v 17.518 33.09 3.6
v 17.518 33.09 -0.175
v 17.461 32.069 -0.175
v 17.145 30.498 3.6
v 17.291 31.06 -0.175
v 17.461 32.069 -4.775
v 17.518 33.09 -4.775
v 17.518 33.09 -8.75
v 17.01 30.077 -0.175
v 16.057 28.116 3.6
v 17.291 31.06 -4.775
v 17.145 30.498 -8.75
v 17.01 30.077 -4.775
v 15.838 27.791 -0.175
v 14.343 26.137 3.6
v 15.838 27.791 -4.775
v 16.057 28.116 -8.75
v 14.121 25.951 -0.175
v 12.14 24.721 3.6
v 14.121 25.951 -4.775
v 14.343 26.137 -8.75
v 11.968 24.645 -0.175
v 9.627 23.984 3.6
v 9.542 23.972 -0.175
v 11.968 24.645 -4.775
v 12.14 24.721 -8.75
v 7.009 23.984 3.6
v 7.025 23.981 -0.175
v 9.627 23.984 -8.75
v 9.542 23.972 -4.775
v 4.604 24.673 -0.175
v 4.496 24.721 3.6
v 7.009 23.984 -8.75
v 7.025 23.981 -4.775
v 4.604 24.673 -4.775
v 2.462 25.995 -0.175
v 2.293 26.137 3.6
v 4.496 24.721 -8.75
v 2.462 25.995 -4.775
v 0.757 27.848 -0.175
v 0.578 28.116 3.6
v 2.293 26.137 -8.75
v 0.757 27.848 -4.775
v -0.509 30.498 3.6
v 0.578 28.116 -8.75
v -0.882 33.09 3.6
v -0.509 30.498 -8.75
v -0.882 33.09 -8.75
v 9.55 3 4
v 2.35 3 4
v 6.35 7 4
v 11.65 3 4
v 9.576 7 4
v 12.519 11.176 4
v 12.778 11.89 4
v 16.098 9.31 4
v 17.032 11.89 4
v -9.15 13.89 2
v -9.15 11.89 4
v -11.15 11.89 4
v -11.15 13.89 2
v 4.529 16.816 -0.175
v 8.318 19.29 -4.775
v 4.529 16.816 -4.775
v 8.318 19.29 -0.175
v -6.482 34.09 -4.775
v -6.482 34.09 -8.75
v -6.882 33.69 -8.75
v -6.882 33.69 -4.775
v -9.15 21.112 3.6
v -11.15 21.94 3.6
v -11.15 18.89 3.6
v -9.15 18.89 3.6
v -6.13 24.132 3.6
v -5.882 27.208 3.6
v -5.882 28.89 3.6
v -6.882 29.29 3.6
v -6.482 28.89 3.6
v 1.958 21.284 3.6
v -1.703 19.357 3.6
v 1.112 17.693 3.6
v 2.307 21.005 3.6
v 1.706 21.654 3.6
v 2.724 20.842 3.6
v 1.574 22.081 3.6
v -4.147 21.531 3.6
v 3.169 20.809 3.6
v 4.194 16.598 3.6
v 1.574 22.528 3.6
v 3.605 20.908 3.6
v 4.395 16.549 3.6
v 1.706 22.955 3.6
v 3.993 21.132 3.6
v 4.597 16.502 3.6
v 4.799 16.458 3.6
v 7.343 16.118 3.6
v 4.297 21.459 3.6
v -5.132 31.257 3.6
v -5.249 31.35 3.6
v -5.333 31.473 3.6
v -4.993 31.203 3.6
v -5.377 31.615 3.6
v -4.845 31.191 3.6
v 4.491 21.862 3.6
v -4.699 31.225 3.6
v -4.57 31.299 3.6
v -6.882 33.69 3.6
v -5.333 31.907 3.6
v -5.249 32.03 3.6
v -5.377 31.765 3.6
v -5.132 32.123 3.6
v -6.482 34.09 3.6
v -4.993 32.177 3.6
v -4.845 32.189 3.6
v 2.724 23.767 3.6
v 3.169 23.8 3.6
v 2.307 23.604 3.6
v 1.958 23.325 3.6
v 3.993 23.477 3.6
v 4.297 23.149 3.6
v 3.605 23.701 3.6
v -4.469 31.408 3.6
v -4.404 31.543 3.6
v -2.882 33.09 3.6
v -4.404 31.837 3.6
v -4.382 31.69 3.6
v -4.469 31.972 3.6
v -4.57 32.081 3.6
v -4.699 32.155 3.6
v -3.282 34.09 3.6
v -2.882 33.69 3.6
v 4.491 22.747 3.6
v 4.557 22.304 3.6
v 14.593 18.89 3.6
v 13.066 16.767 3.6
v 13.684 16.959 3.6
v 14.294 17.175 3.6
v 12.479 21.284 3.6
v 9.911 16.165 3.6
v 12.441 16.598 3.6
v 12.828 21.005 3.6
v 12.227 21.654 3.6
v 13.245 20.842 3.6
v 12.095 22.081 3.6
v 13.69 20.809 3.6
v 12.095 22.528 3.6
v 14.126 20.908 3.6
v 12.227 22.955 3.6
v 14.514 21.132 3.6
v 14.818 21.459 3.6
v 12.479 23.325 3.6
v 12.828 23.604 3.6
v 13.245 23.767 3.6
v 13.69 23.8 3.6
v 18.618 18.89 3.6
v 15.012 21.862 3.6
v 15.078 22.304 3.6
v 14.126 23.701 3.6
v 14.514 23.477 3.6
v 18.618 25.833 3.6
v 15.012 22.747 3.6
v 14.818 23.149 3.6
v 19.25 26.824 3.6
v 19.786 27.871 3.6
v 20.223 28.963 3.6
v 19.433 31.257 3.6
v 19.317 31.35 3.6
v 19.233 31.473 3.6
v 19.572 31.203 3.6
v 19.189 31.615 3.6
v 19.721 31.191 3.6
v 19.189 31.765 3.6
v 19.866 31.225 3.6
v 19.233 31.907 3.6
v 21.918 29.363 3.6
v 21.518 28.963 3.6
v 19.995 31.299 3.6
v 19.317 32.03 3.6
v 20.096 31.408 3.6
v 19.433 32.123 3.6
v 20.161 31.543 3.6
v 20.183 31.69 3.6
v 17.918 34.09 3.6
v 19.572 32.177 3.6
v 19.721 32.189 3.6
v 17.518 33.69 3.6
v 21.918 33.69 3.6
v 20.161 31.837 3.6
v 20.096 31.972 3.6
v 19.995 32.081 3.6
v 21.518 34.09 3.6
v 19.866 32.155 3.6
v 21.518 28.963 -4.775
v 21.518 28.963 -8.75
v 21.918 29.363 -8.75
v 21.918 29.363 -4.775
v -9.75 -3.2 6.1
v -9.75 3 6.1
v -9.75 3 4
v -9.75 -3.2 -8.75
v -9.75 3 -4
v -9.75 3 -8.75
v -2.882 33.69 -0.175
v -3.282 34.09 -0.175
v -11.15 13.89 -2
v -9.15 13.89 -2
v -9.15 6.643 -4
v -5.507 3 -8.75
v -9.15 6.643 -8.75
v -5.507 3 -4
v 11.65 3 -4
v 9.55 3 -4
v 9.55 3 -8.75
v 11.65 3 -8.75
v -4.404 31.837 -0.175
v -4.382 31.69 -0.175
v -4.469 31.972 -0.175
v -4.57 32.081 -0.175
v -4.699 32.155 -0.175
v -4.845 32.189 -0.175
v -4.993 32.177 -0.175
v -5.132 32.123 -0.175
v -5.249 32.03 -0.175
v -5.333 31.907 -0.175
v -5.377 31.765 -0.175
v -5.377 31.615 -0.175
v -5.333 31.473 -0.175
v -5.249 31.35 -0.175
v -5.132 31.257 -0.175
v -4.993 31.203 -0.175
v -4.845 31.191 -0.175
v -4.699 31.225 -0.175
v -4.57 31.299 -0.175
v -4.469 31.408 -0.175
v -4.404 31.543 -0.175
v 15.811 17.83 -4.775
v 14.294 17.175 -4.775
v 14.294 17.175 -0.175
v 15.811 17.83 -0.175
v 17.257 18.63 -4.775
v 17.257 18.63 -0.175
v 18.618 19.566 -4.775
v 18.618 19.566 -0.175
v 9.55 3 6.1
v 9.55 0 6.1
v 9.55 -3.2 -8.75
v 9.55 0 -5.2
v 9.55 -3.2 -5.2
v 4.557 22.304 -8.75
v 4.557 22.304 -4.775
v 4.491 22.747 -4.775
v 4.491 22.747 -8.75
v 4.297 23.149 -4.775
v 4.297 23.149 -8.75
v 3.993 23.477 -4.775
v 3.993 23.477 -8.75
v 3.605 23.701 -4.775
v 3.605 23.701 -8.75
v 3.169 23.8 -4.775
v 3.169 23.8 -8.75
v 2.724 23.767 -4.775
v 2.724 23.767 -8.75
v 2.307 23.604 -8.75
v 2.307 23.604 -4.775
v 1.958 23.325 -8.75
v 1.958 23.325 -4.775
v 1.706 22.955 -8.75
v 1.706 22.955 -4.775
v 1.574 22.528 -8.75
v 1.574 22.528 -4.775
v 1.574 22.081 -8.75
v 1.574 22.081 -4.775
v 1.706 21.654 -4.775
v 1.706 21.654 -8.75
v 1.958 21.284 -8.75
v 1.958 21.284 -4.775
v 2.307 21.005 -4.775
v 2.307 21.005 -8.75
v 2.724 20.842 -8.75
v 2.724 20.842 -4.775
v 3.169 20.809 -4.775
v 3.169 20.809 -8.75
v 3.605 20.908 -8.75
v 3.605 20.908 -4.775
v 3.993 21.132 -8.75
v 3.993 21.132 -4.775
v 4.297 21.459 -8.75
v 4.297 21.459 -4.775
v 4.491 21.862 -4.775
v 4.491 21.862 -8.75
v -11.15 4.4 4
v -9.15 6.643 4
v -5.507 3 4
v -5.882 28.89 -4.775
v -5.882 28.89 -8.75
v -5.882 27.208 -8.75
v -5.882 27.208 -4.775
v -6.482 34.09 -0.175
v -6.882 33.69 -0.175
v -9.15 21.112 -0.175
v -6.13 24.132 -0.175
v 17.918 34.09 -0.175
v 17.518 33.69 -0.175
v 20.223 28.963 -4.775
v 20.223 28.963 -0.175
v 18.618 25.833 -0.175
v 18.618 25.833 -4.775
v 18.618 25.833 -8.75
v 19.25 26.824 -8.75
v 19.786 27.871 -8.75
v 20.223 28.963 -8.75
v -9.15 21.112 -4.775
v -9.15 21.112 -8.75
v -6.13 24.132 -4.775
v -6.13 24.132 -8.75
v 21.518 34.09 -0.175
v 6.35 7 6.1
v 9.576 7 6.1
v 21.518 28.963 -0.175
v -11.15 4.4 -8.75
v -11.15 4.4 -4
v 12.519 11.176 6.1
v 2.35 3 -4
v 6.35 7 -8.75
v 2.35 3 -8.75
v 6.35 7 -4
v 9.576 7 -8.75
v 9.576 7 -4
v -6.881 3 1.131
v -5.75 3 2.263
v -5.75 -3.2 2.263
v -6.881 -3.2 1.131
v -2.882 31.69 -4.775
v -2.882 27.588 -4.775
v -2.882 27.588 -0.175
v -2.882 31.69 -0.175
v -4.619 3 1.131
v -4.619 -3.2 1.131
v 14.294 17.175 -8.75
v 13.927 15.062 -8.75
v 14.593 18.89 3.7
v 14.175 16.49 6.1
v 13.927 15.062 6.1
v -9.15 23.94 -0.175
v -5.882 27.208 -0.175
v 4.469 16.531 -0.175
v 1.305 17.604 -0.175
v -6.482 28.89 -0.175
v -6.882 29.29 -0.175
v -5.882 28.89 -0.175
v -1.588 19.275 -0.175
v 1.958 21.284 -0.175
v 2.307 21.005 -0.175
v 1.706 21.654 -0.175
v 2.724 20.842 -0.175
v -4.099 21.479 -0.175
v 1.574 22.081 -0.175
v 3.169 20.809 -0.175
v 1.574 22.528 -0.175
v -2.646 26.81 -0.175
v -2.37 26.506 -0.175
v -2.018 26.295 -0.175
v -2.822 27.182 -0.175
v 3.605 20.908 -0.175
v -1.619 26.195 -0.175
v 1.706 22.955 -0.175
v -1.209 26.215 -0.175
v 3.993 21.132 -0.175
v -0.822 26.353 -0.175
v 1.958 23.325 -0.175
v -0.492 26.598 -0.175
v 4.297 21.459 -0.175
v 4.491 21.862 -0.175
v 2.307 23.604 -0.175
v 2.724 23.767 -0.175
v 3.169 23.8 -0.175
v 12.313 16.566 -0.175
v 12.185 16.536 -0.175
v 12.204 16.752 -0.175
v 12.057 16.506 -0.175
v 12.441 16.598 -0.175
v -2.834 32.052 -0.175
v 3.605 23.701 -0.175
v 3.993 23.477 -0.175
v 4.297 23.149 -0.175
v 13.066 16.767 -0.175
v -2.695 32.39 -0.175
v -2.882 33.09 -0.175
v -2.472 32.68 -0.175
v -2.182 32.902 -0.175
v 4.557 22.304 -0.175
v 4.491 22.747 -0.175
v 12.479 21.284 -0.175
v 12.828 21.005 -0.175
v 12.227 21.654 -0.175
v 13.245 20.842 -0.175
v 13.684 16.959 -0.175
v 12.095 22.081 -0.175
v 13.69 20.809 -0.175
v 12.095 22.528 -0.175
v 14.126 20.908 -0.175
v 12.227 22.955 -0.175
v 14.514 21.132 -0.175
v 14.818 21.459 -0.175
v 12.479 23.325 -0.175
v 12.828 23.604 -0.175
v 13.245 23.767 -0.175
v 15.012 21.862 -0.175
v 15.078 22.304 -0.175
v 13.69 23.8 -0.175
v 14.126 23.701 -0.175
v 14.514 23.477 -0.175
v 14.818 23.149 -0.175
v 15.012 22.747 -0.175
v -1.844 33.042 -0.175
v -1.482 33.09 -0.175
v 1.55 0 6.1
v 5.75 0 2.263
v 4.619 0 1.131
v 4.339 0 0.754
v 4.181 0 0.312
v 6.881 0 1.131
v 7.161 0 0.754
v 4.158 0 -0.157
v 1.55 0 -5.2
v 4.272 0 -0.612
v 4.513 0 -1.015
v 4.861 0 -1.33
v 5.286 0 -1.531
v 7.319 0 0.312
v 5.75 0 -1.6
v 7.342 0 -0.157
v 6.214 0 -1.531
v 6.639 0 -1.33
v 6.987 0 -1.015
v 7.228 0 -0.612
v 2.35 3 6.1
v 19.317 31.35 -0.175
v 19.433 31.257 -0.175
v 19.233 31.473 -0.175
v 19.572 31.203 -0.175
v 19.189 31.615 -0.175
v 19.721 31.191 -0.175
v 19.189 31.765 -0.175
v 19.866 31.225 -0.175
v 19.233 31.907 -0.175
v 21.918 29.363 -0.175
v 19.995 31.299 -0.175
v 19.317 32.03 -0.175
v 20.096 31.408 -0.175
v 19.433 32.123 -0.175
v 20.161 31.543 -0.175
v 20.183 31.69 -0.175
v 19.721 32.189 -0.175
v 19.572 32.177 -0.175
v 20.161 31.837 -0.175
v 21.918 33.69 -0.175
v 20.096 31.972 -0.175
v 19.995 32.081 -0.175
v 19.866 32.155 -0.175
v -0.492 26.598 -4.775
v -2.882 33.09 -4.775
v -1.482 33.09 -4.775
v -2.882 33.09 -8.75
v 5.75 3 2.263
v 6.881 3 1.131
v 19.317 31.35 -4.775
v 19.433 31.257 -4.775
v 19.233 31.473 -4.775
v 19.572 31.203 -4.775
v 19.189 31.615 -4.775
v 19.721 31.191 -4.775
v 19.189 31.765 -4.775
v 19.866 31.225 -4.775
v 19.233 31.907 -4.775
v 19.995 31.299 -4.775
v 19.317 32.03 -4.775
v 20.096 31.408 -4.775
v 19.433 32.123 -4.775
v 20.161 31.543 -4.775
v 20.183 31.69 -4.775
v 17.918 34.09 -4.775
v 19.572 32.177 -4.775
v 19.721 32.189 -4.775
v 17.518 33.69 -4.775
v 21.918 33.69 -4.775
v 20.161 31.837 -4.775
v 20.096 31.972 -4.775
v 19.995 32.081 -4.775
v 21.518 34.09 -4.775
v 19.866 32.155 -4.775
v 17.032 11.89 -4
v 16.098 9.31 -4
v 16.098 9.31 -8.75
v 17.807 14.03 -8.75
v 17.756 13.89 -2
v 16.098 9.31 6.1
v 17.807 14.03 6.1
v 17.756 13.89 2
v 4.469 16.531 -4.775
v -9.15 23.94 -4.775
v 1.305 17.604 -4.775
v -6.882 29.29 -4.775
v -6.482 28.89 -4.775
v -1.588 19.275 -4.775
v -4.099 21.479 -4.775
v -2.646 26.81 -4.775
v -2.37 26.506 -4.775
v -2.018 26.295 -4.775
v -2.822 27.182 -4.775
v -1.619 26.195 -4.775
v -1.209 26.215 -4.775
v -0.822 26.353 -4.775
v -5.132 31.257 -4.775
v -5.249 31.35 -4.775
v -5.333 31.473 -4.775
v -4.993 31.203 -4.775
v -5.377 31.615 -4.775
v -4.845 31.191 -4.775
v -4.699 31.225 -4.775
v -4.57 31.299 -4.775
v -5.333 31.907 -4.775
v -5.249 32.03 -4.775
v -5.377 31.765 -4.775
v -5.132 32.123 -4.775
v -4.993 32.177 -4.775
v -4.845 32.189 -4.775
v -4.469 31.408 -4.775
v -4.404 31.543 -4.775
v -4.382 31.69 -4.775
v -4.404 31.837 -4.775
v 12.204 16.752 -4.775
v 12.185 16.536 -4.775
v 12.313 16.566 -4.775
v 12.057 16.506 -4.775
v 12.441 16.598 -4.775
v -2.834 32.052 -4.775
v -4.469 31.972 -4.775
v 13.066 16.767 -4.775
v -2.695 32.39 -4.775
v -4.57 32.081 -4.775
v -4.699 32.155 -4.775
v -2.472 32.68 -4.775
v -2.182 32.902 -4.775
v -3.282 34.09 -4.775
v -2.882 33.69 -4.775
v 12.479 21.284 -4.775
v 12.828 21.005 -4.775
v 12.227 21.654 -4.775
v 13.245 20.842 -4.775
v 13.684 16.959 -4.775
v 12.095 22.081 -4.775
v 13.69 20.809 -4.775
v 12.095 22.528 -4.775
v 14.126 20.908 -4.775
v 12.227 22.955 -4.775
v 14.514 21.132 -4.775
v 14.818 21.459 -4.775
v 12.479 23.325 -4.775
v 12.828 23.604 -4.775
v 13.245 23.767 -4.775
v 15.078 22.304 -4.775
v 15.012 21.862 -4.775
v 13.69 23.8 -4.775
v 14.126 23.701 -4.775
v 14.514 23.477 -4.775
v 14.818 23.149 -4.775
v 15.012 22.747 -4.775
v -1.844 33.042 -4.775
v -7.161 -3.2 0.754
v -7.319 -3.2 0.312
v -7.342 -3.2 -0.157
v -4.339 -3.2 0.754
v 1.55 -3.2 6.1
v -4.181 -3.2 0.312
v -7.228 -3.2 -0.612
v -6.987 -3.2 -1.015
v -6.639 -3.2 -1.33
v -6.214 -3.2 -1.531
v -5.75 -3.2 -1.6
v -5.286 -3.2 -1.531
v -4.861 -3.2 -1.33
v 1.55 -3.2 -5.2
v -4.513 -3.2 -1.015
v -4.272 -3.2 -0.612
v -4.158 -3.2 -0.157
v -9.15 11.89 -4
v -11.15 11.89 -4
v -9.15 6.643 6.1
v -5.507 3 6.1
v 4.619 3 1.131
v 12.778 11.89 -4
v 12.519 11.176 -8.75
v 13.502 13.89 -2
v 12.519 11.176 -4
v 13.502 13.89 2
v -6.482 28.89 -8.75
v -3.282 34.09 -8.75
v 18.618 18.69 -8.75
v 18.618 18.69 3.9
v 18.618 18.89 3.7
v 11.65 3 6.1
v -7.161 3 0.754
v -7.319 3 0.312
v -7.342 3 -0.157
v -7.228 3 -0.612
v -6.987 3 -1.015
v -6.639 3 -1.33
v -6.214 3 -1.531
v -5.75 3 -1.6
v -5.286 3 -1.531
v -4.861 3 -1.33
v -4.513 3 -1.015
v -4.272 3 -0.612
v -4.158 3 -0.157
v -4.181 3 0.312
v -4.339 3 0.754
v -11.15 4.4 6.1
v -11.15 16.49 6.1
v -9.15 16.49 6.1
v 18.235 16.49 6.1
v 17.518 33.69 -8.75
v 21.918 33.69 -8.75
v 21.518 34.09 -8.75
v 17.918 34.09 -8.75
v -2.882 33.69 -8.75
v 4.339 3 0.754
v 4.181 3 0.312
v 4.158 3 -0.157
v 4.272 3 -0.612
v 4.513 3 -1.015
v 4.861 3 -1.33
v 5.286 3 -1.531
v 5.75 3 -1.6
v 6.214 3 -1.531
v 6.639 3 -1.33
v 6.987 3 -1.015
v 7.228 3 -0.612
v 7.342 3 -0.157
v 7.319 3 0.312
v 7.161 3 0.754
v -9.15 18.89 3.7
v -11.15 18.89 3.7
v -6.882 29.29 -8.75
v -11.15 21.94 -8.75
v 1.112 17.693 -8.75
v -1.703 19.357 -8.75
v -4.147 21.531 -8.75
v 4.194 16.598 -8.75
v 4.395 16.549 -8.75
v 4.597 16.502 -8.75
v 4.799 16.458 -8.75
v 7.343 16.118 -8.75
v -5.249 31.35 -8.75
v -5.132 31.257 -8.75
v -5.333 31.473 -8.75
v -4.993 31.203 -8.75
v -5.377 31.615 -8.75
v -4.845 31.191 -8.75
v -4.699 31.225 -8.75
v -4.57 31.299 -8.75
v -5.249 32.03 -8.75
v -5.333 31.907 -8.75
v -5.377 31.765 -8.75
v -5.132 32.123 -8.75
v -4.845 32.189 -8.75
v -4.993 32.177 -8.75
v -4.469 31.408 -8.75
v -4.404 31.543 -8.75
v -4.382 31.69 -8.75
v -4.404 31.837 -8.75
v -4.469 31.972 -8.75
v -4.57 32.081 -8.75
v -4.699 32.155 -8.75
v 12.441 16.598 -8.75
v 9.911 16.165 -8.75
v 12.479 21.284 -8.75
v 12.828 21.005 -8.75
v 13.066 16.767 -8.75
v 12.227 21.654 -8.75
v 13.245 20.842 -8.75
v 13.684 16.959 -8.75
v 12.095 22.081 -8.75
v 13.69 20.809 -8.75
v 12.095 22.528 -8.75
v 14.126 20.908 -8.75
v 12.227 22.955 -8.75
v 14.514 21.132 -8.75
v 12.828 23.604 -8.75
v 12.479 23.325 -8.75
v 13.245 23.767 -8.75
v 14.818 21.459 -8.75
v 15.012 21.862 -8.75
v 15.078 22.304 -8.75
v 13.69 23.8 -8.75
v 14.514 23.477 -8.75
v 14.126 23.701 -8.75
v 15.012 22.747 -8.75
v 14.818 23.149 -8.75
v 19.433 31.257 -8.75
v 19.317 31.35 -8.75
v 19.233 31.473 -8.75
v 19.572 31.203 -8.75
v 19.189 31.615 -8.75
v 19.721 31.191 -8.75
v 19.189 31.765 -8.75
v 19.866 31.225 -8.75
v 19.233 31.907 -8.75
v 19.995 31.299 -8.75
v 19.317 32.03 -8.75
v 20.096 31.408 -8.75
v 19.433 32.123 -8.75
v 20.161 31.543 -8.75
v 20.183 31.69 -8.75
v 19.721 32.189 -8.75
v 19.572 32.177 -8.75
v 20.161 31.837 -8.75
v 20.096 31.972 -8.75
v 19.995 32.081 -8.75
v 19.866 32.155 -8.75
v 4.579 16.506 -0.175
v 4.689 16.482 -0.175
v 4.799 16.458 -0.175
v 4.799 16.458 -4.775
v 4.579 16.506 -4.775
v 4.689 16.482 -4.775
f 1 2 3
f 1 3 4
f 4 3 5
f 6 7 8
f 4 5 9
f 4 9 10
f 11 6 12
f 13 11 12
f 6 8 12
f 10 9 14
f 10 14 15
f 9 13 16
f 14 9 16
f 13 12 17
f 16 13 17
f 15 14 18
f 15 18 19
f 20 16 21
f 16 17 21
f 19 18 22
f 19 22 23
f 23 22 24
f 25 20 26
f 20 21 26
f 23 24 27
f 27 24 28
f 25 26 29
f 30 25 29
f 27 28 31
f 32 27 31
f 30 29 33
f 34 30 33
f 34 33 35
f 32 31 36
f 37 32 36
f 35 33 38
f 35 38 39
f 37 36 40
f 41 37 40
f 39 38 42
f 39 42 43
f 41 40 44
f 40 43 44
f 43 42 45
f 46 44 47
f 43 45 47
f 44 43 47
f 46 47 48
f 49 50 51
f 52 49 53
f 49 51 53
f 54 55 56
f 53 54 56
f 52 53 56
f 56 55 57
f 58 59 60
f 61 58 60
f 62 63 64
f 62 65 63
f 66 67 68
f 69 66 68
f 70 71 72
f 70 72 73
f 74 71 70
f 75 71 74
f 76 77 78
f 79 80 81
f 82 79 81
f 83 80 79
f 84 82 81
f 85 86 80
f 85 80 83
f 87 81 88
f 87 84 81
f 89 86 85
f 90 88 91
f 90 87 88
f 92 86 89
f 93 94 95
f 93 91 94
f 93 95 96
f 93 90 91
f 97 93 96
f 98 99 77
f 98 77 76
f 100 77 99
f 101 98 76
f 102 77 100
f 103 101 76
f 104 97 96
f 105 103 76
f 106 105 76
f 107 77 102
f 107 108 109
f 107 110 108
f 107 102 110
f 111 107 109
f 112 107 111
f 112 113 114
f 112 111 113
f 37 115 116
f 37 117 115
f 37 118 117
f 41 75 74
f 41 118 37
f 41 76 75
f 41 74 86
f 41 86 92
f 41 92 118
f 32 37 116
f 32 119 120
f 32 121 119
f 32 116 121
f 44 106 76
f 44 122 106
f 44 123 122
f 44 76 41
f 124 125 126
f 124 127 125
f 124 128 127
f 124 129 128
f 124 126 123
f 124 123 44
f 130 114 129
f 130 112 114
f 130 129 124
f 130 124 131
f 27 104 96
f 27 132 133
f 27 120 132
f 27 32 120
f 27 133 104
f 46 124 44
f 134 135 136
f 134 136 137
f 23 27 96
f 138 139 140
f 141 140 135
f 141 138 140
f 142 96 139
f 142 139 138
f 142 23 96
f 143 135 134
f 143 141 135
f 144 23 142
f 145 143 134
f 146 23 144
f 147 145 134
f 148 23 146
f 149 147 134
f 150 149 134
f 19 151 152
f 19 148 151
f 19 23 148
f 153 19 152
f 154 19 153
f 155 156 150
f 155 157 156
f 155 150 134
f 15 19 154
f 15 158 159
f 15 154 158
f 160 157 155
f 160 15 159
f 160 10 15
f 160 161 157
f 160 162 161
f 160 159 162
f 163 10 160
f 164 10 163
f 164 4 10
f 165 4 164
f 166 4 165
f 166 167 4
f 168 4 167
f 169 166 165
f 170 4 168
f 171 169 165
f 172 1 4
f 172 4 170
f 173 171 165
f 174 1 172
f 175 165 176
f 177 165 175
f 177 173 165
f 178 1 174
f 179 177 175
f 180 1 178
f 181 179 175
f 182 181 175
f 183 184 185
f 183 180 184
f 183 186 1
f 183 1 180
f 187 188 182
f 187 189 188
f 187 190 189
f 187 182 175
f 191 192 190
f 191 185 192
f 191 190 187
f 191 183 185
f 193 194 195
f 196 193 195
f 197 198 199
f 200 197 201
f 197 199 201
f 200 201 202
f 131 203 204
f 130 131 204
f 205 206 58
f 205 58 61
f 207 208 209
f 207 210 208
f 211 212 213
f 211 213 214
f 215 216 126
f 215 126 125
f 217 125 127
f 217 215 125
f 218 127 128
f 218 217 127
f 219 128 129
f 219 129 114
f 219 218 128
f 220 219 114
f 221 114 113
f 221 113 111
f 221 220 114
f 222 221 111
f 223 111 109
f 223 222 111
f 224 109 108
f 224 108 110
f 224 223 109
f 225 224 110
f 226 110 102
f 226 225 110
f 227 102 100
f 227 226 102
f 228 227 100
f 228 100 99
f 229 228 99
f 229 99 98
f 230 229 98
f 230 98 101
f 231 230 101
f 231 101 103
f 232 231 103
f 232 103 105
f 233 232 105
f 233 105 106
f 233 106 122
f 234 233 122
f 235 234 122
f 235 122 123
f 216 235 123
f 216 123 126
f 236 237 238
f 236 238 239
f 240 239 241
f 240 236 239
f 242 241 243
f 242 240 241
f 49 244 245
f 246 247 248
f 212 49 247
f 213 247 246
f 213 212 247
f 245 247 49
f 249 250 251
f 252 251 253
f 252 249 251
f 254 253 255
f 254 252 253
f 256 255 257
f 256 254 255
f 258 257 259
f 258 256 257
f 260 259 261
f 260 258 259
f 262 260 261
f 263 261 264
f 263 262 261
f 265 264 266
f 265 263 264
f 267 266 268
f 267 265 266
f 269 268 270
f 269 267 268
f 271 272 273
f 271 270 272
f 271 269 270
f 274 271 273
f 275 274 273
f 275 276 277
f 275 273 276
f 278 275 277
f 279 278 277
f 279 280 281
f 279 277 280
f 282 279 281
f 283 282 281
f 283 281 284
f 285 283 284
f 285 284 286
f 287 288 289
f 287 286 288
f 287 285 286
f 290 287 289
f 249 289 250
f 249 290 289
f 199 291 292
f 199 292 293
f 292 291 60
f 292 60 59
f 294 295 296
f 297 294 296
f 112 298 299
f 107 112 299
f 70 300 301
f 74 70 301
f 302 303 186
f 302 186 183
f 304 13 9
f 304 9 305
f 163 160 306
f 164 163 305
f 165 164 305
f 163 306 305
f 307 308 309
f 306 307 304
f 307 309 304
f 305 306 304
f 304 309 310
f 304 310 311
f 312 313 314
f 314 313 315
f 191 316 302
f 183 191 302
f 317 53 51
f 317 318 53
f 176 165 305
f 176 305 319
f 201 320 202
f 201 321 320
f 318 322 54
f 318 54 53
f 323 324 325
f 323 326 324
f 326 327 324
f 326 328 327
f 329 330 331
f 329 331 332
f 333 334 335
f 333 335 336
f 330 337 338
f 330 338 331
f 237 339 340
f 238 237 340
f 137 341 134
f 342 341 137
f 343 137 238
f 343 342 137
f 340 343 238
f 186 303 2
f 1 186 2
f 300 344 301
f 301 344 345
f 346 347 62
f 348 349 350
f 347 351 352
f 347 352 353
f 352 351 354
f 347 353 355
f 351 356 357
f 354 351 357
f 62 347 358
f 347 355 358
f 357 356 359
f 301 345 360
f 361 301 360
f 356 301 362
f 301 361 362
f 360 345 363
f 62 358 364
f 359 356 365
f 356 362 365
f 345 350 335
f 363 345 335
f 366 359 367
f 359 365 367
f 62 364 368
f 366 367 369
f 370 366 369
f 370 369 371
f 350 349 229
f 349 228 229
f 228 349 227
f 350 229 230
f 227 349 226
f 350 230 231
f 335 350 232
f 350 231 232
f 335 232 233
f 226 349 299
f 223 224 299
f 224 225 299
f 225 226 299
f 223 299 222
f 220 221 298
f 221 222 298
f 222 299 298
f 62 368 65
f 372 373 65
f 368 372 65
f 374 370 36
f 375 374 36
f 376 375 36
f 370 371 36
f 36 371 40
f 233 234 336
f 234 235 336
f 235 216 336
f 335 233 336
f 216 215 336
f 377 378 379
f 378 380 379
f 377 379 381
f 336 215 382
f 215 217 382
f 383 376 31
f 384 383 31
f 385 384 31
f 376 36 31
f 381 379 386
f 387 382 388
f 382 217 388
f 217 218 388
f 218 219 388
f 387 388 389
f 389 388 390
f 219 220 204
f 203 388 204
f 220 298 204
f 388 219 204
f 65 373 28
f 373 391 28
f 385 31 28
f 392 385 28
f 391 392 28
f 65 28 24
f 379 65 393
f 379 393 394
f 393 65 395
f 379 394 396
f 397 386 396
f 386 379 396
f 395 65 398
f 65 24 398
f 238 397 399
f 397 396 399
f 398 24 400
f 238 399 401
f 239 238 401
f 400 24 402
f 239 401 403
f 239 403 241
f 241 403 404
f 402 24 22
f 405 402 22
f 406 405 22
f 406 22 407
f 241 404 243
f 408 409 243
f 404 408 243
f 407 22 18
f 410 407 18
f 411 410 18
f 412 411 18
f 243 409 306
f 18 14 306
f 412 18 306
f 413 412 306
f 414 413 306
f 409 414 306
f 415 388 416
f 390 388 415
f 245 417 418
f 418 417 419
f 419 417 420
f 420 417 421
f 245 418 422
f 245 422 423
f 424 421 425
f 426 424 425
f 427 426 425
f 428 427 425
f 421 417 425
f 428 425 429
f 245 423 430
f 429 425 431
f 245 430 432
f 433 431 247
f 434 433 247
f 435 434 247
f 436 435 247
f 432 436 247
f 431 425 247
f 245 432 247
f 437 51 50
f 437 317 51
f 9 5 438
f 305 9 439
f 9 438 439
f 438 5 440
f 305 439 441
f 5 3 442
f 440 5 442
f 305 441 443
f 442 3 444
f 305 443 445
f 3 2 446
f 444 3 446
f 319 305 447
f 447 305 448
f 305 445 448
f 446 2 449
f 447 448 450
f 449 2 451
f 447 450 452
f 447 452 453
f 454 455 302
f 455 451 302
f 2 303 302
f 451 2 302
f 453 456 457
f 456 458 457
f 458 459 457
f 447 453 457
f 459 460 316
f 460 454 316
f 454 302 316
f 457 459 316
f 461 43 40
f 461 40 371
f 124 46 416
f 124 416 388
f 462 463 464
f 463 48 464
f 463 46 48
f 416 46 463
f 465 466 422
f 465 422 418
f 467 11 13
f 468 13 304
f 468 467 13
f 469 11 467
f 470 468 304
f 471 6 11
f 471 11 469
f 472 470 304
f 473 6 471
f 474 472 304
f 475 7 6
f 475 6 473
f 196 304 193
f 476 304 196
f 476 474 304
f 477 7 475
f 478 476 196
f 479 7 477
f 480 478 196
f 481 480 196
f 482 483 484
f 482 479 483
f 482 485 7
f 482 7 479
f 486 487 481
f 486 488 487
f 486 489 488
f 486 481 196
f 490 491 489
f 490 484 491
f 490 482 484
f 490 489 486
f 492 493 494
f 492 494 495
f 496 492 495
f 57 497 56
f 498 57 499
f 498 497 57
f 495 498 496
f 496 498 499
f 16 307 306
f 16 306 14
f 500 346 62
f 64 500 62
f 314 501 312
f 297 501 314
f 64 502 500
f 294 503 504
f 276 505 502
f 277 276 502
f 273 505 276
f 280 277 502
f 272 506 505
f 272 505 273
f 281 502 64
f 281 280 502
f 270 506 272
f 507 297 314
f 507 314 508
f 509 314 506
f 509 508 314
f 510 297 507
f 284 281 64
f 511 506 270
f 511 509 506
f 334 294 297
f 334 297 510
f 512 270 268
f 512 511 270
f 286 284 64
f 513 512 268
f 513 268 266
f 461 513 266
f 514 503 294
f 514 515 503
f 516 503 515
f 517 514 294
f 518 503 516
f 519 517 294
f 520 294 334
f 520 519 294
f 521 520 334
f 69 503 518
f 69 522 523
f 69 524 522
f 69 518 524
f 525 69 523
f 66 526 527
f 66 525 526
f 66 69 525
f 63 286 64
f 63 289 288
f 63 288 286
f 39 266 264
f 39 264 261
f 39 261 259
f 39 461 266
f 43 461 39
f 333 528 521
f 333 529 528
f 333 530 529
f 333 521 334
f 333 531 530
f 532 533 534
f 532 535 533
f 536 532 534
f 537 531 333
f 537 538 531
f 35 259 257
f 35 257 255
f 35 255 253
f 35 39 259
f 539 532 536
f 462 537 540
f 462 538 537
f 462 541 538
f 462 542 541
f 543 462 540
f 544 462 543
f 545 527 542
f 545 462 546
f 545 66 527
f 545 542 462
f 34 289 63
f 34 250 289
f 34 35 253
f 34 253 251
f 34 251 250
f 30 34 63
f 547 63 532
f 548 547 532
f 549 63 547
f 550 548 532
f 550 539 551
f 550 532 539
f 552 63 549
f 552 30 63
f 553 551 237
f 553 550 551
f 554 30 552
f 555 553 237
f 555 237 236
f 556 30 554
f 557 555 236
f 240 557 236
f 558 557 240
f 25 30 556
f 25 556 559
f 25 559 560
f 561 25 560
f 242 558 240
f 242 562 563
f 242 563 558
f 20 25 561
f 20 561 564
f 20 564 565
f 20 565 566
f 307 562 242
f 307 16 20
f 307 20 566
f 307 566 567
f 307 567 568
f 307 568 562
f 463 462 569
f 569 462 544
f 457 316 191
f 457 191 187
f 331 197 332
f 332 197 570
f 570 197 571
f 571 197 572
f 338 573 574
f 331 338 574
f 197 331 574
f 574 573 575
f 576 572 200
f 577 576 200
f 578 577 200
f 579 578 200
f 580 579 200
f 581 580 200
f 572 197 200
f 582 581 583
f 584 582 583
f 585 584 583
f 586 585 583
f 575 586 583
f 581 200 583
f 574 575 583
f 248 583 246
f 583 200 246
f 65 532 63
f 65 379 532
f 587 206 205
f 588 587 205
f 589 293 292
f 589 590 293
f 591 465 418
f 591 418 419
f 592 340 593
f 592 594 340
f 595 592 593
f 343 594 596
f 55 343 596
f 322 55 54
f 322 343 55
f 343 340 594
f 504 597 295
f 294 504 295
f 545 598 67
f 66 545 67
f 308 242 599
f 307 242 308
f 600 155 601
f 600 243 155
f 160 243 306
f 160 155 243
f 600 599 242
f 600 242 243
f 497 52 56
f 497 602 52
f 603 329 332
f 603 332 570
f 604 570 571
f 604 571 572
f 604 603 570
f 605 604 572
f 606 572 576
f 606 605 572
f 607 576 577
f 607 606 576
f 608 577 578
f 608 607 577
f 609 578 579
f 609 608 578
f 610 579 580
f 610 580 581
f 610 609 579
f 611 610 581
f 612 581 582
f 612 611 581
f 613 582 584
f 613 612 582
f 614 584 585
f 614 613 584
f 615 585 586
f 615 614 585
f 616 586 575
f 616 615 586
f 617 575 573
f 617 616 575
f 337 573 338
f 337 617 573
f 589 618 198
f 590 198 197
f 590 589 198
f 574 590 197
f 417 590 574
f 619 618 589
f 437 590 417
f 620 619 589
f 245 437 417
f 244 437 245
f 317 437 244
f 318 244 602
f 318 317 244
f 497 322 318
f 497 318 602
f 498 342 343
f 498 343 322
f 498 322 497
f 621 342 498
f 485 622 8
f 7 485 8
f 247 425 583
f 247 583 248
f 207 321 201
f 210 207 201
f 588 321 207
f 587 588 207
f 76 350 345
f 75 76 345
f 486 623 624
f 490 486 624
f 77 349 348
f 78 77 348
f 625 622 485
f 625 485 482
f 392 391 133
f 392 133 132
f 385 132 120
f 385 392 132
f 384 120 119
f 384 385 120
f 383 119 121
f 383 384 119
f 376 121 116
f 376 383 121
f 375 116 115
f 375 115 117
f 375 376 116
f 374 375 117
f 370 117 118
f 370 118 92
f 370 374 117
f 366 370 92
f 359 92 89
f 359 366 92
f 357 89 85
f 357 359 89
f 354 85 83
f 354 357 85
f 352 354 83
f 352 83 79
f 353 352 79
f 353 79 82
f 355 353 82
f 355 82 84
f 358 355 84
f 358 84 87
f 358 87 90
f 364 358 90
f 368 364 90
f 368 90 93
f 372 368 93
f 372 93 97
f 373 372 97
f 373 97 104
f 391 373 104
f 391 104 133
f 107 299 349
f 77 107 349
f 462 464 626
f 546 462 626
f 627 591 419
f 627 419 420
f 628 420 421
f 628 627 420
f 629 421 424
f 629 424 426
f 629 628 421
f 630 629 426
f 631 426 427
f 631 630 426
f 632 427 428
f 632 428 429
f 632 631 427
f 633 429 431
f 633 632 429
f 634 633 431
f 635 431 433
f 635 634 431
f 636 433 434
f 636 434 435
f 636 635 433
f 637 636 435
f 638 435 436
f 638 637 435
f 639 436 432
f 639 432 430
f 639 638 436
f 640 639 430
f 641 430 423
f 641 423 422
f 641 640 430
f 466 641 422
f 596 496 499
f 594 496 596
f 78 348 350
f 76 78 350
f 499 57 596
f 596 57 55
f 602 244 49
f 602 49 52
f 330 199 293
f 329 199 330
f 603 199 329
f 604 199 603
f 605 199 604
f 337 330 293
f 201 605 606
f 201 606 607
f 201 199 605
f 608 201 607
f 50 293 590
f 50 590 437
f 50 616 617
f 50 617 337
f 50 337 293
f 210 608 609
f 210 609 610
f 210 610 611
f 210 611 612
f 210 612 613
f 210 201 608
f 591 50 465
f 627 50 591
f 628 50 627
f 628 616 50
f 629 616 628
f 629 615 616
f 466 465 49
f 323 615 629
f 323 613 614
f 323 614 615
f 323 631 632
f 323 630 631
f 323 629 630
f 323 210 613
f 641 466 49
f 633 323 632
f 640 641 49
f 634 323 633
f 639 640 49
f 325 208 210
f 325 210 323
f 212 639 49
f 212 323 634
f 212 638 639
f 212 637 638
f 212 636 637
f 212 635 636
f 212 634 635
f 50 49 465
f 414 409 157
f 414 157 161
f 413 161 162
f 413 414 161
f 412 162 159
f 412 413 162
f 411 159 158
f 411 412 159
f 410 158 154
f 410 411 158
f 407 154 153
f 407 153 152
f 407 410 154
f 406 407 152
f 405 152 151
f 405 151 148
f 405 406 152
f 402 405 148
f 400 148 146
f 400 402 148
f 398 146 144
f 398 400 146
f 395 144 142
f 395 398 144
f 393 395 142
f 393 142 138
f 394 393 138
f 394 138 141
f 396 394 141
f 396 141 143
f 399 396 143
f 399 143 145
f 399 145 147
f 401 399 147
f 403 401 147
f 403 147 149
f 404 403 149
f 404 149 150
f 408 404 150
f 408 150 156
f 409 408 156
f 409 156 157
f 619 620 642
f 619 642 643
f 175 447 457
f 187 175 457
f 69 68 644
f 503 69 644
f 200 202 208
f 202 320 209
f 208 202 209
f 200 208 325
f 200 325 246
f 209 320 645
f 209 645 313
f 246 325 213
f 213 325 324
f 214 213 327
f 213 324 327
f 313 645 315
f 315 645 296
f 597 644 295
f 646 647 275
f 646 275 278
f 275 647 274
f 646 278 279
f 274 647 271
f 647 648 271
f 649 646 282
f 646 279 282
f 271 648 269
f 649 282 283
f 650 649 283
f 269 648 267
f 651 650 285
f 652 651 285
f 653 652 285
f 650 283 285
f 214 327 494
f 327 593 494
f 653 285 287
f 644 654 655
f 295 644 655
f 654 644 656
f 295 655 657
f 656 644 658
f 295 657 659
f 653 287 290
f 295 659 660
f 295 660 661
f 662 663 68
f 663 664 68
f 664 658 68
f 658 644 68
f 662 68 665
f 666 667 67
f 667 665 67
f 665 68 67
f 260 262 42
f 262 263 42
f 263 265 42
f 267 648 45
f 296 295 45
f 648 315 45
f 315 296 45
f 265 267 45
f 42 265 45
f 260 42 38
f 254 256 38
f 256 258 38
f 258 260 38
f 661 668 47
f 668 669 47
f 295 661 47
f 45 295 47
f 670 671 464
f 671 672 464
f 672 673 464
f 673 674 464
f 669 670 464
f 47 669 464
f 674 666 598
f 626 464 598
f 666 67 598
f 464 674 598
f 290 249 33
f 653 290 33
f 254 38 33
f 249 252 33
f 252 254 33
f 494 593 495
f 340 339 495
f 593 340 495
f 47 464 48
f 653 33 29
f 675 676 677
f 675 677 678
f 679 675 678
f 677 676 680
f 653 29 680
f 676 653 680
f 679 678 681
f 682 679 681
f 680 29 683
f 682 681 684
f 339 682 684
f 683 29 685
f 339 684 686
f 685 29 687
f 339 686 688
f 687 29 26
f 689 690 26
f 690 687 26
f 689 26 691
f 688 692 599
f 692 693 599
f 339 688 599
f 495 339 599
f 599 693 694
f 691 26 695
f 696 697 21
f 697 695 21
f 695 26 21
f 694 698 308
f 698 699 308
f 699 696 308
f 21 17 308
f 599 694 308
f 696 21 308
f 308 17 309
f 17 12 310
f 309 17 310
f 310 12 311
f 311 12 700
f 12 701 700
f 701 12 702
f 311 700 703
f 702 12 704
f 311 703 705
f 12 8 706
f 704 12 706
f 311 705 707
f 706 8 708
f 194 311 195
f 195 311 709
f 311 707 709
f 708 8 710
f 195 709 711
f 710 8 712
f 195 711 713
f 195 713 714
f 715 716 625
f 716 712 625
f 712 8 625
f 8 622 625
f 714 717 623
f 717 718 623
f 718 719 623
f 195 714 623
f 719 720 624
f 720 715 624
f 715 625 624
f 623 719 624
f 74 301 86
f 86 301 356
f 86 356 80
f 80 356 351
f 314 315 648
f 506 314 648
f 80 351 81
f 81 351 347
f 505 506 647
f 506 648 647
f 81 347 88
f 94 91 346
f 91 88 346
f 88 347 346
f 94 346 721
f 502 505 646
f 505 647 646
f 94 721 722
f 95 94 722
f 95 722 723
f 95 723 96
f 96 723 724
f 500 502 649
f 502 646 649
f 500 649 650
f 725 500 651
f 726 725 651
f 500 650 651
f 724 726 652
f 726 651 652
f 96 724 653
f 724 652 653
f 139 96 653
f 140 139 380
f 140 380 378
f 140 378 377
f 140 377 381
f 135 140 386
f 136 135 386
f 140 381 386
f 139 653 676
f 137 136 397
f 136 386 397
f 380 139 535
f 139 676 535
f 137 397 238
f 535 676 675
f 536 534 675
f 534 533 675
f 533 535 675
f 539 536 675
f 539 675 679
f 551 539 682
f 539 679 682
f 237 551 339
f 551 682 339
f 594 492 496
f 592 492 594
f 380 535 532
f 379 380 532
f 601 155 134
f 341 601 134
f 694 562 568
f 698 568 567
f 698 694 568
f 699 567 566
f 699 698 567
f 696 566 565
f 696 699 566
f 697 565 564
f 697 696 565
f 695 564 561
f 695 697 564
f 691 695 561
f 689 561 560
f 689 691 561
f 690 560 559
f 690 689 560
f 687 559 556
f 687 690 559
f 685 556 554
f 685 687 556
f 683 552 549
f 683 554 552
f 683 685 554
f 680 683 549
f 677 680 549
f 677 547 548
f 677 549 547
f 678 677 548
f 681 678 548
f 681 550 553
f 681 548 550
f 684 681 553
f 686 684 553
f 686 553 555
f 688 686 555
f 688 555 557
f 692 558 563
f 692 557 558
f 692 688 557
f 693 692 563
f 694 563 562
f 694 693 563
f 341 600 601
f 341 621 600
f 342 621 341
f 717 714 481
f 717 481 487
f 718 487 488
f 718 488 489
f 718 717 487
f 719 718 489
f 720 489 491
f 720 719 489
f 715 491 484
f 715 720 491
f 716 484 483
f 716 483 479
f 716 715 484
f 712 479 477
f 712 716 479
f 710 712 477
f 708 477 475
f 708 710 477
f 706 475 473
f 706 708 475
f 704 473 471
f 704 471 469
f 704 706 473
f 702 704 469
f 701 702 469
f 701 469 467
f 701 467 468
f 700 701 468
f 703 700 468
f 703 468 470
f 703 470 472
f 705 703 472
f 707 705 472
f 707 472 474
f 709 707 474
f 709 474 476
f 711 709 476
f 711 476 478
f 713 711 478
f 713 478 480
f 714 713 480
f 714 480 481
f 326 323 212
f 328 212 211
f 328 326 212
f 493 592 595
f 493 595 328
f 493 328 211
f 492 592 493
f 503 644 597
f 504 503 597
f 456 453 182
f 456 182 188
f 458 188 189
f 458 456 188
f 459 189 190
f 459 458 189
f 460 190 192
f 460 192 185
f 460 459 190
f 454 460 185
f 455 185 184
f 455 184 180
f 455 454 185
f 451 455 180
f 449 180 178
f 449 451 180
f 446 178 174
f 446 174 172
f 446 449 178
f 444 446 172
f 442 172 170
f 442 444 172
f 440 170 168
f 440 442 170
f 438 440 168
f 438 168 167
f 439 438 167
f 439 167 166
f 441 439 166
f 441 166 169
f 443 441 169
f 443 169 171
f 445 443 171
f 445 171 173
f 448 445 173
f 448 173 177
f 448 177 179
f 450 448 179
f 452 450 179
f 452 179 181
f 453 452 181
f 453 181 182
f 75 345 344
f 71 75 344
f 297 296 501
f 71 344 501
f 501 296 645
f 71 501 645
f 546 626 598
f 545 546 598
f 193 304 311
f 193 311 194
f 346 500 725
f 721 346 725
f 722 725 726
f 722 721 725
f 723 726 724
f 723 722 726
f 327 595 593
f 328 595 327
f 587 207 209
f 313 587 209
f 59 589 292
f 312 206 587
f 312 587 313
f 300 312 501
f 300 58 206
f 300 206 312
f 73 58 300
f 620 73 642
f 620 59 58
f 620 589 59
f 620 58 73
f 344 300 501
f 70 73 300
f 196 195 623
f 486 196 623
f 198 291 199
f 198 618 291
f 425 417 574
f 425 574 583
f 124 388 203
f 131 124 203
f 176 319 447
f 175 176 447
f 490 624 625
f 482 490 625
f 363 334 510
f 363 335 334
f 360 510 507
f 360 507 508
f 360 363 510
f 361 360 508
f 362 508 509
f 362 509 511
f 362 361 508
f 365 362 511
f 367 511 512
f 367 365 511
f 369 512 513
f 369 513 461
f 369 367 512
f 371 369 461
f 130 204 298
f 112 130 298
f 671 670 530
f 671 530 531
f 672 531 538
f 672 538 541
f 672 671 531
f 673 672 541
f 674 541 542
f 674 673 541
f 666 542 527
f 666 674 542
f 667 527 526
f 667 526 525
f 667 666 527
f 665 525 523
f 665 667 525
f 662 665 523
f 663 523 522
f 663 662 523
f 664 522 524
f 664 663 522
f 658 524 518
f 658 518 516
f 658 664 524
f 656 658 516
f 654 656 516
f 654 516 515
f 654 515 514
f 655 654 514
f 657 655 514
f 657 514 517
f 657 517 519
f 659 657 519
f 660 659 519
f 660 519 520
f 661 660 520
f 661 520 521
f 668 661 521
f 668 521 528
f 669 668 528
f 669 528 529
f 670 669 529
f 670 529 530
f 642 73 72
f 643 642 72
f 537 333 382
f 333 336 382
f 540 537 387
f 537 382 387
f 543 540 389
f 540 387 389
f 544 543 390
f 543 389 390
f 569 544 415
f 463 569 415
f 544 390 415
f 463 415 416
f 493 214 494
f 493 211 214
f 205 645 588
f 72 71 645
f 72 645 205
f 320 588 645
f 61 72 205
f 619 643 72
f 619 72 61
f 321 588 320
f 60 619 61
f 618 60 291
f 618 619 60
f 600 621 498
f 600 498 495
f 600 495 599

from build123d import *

# Parameters (mm, degrees)
BOSS_EXTRUDE1_DEPTH             = 3.2
BOSS_EXTRUDE2_START             = 3
SKETCH1_3_W                     = 19.3
SKETCH1_3_H                     = 14.85
BOSS_EXTRUDE2_DEPTH             = 3
BOSS_EXTRUDE3_DEPTH             = 3.6
BOSS_EXTRUDE3_DEPTH_BACK        = 8.75
BOSS_EXTRUDE4_REACH             = 42.113
BOSS_EXTRUDE4_DIRECTION_2_REACH = 42.113
CHAMFER1_SIZE                   = 2.4
CUT_EXTRUDE1_DEPTH              = 4
CUT_EXTRUDE1_DEPTH_BACK         = 4
CHAMFER2_SIZE                   = 2
BOSS_EXTRUDE5_START             = -6.175
BOSS_EXTRUDE5_DEPTH             = 12.35
CUT_EXTRUDE2_START              = -2.2
CUT_EXTRUDE2_OUTLINE_R          = 0.5
CUT_EXTRUDE2_DEPTH              = 4.6
CUT_EXTRUDE3_START              = -6.175
SKETCH4_5_R                     = 1.5
SKETCH4_5_R_2                   = 0.5
CUT_EXTRUDE3_DEPTH              = 12.35
BOSS_EXTRUDE6_REACH             = 43.446
BOSS_EXTRUDE6_DIRECTION_2_REACH = 43.446
FILLET1_R                       = 1.4
CHAMFER3_SIZE                   = 0.4
CHAMFER3_SIZE_2                 = 0.283047342


with BuildPart() as part:
    # Sketch1 → Boss-Extrude1 (new body)
    with BuildSketch(Plane(origin=(0, 0, 0), x_dir=(1, 0, 0), z_dir=(0, 1, 0))):
        Polygon((-9.75, 8.75), (-9.75, -6.1), (1.55, -6.1), (1.55, 5.2), (9.55, 5.2), (9.55, 8.75), align=None)
        with BuildLine():
            Line((-4.61862915, -1.13137085), (-5.75, -2.2627417))
            Line((-5.75, -2.2627417), (-6.88137085, -1.13137085))
            ThreePointArc((-6.88137085, -1.13137085), (-5.75, 1.6), (-4.61862915, -1.13137085))
        make_face(mode=Mode.SUBTRACT)
    extrude(amount=-BOSS_EXTRUDE1_DEPTH)

    # Sketch1<3> → Boss-Extrude2 (add)
    with BuildSketch(Plane(origin=(0, 0, 0), x_dir=(1, 0, 0), z_dir=(0, 1, 0)).offset(BOSS_EXTRUDE2_START)):
        with Locations((-0.1, 1.325)):
            Rectangle(SKETCH1_3_W, SKETCH1_3_H)
        with BuildLine():
            Line((-4.61862915, -1.13137085), (-5.75, -2.2627417))
            Line((-5.75, -2.2627417), (-6.88137085, -1.13137085))
            ThreePointArc((-6.88137085, -1.13137085), (-5.75, 1.6), (-4.61862915, -1.13137085))
        make_face(mode=Mode.SUBTRACT)
        with BuildLine():
            Line((6.88137085, -1.13137085), (5.75, -2.2627417))
            Line((5.75, -2.2627417), (4.61862915, -1.13137085))
            ThreePointArc((4.61862915, -1.13137085), (5.75, 1.6), (6.88137085, -1.13137085))
        make_face(mode=Mode.SUBTRACT)
    extrude(amount=-BOSS_EXTRUDE2_DEPTH)

    # Boss-Extrude4: up to this face of the body (flat: up to its plane)
    boss_extrude4_end = Plane(part.part.faces().sort_by_distance((-1.637741867, 0.308250053, 6.1))[0])
    # Sketch2<3> → Boss-Extrude4 (add, up to the picked face)
    with BuildSketch(Plane.XY, mode=Mode.PRIVATE) as boss_extrude4_sk1:
        Polygon((9.575660702, 7), (6.35, 7), (2.35, 3), (11.65, 3), (16.097729758, 9.31), (17.807115613, 14.03), (18.617856015, 18.69), (18.617856015, 18.89), (14.592565903, 18.89), (13.926529786, 15.061735984), (12.519365433, 11.176237735), align=None)
    boss_extrude4_tool1 = split(extrude(boss_extrude4_sk1.sketch, amount=BOSS_EXTRUDE4_REACH, mode=Mode.PRIVATE), bisect_by=boss_extrude4_end, keep=Keep.BOTH, mode=Mode.PRIVATE)
    # Sketch2<3> → Boss-Extrude4 (add, up to the picked face)
    with BuildSketch(Plane.XY, mode=Mode.PRIVATE) as boss_extrude4_sk2:
        Polygon((-11.15, 18.89), (-11.15, 4.4), (-9.75, 3), (-5.507359313, 3), (-9.15, 6.642640687), (-9.15, 18.89), align=None)
    boss_extrude4_tool2 = split(extrude(boss_extrude4_sk2.sketch, amount=BOSS_EXTRUDE4_REACH, mode=Mode.PRIVATE), bisect_by=boss_extrude4_end, keep=Keep.BOTH, mode=Mode.PRIVATE)


with BuildPart() as body_2:
    # Sketch2 → Boss-Extrude3 (new, two sides: drawn at the far end of the back side and taken through both)
    with BuildSketch(Plane.XY.offset(-BOSS_EXTRUDE3_DEPTH_BACK)):
        with BuildLine():
            ThreePointArc((-1.723060387, 23.049083817), (6.015471186, 19.077897228), (14.617856015, 20.364042276))
            Line((14.617856015, 20.364042276), (14.617856015, 19.035363324))
            Line((14.617856015, 19.035363324), (14.592565903, 18.89))
            Line((14.592565903, 18.89), (18.617856015, 18.89))
            Line((18.617856015, 18.89), (18.617856015, 25.832589994))
            ThreePointArc((18.617856015, 25.832589994), (20.329100746, 29.283426738), (20.917856015, 33.09))
            Line((20.917856015, 33.09), (17.517856015, 33.09))
            ThreePointArc((17.517856015, 33.09), (8.317856015, 23.89), (-0.882143985, 33.09))
            Line((-0.882143985, 33.09), (-5.882143985, 33.09))
            Line((-5.882143985, 33.09), (-5.882143985, 27.208167414))
            Line((-5.882143985, 27.208167414), (-11.15, 21.940311399))
            Line((-11.15, 21.940311399), (-11.15, 18.89))
            Line((-11.15, 18.89), (-9.15, 18.89))
            Line((-9.15, 18.89), (-9.15, 21.111884275))
            Line((-9.15, 21.111884275), (-4.467930423, 25.793953852))
            Line((-4.467930423, 25.793953852), (-1.723060387, 23.049083817))
        make_face()
    extrude(amount=BOSS_EXTRUDE3_DEPTH + BOSS_EXTRUDE3_DEPTH_BACK)


with BuildPart() as part_1:
    add(part.part)

    add(body_2.part)  # Boss-Extrude4 merges body 2
    add(boss_extrude4_tool1.solids().sort_by(Axis((12.380692, 9.593109, 0), (0, 0, 1)))[0])
    add(boss_extrude4_tool2.solids().sort_by(Axis((-9.743618, 9.947894, 0), (0, 0, 1)))[0])

    # Boss-Extrude4 direction 2: up to this face of the body (flat: up to its plane)
    boss_extrude4_direction_2_end = Plane(part_1.part.faces().sort_by_distance((-0.1, -0.1, -8.75))[0])
    # Sketch2<3> → Boss-Extrude4 direction 2 (add, up to the picked face)
    with BuildSketch(Plane.XY, mode=Mode.PRIVATE) as boss_extrude4_direction_2_sk1:
        Polygon((9.575660702, 7), (6.35, 7), (2.35, 3), (11.65, 3), (16.097729758, 9.31), (17.807115613, 14.03), (18.617856015, 18.69), (18.617856015, 18.89), (14.592565903, 18.89), (13.926529786, 15.061735984), (12.519365433, 11.176237735), align=None)
    boss_extrude4_direction_2_tool1 = split(extrude(boss_extrude4_direction_2_sk1.sketch, amount=-BOSS_EXTRUDE4_DIRECTION_2_REACH, mode=Mode.PRIVATE), bisect_by=boss_extrude4_direction_2_end, keep=Keep.BOTH, mode=Mode.PRIVATE)
    # Sketch2<3> → Boss-Extrude4 direction 2 (add, up to the picked face)
    with BuildSketch(Plane.XY, mode=Mode.PRIVATE) as boss_extrude4_direction_2_sk2:
        Polygon((-11.15, 18.89), (-11.15, 4.4), (-9.75, 3), (-5.507359313, 3), (-9.15, 6.642640687), (-9.15, 18.89), align=None)
    boss_extrude4_direction_2_tool2 = split(extrude(boss_extrude4_direction_2_sk2.sketch, amount=-BOSS_EXTRUDE4_DIRECTION_2_REACH, mode=Mode.PRIVATE), bisect_by=boss_extrude4_direction_2_end, keep=Keep.BOTH, mode=Mode.PRIVATE)
    add(boss_extrude4_direction_2_tool1.solids().sort_by(Axis((12.380692, 9.593109, 0), (0, 0, -1)))[0])
    add(boss_extrude4_direction_2_tool2.solids().sort_by(Axis((-9.743618, 9.947894, 0), (0, 0, -1)))[0])

    # Chamfer1
    chamfer1_edges = [part_1.edges().sort_by_distance(p)[0] for p in [
        (-10.15, 18.89, 6.1),
        (16.605210959, 18.89, 6.1),
    ]]
    chamfer(chamfer1_edges, length=CHAMFER1_SIZE)

    # Sketch2<5> → Cut-Extrude1 (cut, two sides: drawn at the far end of the back side and taken through both)
    with BuildSketch(Plane.XY.offset(-CUT_EXTRUDE1_DEPTH_BACK)):
        Polygon((9.575660702, 7), (6.35, 7), (2.35, 3), (11.65, 3), (16.097729758, 9.31), (17.75641349, 13.89), (13.502176202, 13.89), (12.519365433, 11.176237735), align=None)
        Polygon((-9.15, 6.642640687), (-9.15, 13.89), (-11.15, 13.89), (-11.15, 4.4), (-9.75, 3), (-5.507359313, 3), align=None)
    extrude(amount=CUT_EXTRUDE1_DEPTH + CUT_EXTRUDE1_DEPTH_BACK, mode=Mode.SUBTRACT)

    # Chamfer2
    chamfer2_edges = [part_1.edges().sort_by_distance(p)[0] for p in [
        (15.629294846, 13.89, 4),
        (15.629294846, 13.89, -4),
        (-10.15, 13.89, 4),
        (-10.15, 13.89, -4),
    ]]
    chamfer(chamfer2_edges, length=CHAMFER2_SIZE)

    # Boss-Extrude5: read off the stored shape, not the designer's step
    # Boss-Extrude5 outline → Boss-Extrude5 (add)
    with BuildSketch(Plane.XY.offset(-2.575).offset(BOSS_EXTRUDE5_START)):
        Polygon((-6.882143985, 34.09), (-6.882143985, 28.89), (-5.882143985, 28.89), (-5.882143985, 33.09), (-2.882143985, 33.09), (-2.882143985, 34.09), align=None)
        with BuildLine():
            Line((21.917856015, 28.962870062), (21.917856015, 34.09))
            Line((21.917856015, 34.09), (17.517856015, 34.09))
            Line((17.517856015, 34.09), (17.517856015, 33.09))
            Line((17.517856015, 33.09), (20.917856015, 33.09))
            ThreePointArc((20.917856015, 33.09), (20.742867518, 30.997372673), (20.222762502, 28.962870062))
            Line((20.222762502, 28.962870062), (21.917856015, 28.962870062))
        make_face()
        with BuildLine():
            ThreePointArc((-6.130248208, 24.131636067), (2.836901124, 16.997792771), (14.294214917, 17.175128519))
            Line((14.294214917, 17.175128519), (14.617856015, 19.035363324))
            Line((14.617856015, 19.035363324), (14.617856015, 20.364042276))
            ThreePointArc((14.617856015, 20.364042276), (6.015471262, 19.077897215), (-1.723060278, 23.049083707))
            Line((-1.723060278, 23.049083707), (-4.467930423, 25.793953852))
            Line((-4.467930423, 25.793953852), (-6.130248208, 24.131636067))
        make_face()
    extrude(amount=BOSS_EXTRUDE5_DEPTH)

    # Cut-Extrude2: read off the stored shape, not the designer's step
    # Cut-Extrude2 outline → Cut-Extrude2 (cut)
    # profile 1 of 2: a face of its own
    with BuildSketch(Plane.XY.offset(-2.575).offset(CUT_EXTRUDE2_START)):
        with BuildLine():
            ThreePointArc((17.517856015, 33.09), (17.390086637, 31.562049888), (17.010327418, 30.076540045))
            Line((17.010327418, 30.076540045), (20.222762502, 28.962870062))
            Line((20.222762502, 28.962870062), (21.917856015, 28.962870062))
            Line((21.917856015, 28.962870062), (21.917856015, 34.09))
            Line((21.917856015, 34.09), (17.517856015, 34.09))
            Line((17.517856015, 34.09), (17.517856015, 33.09))
        make_face()
        with Locations((19.68334966, 31.69)):
            Circle(CUT_EXTRUDE2_OUTLINE_R, mode=Mode.SUBTRACT)
    # profile 2 of 2: a face of its own
    with BuildSketch(Plane.XY.offset(-2.575).offset(CUT_EXTRUDE2_START)):
        with BuildLine():
            Line((-9.15, 23.940311399), (-9.15, 21.111884275))
            Line((-9.15, 21.111884275), (-6.130248208, 24.131636067))
            ThreePointArc((-6.130248208, 24.131636067), (2.836901124, 16.997792771), (14.294214917, 17.175128519))
            ThreePointArc((14.294214917, 17.175128519), (16.543336338, 18.21245069), (18.617856015, 19.565577646))
            Line((18.617856015, 19.565577646), (18.617856015, 25.832589994))
            Line((18.617856015, 25.832589994), (15.838490936, 27.790938726))
            ThreePointArc((15.838490936, 27.790938726), (8.283173059, 23.890065376), (0.757481426, 27.847792825))
            Line((0.757481426, 27.847792825), (-2.882143985, 24.208167414))
            Line((-2.882143985, 24.208167414), (-2.882143985, 34.09))
            Line((-2.882143985, 34.09), (-6.882143985, 34.09))
            Line((-6.882143985, 34.09), (-6.882143985, 28.89))
            Line((-6.882143985, 28.89), (-5.882143985, 28.89))
            Line((-5.882143985, 28.89), (-5.882143985, 27.208167414))
            Line((-5.882143985, 27.208167414), (-9.15, 23.940311399))
        make_face()
        with Locations((-4.882143985, 31.69)):
            Circle(CUT_EXTRUDE2_OUTLINE_R, mode=Mode.SUBTRACT)
    extrude(amount=CUT_EXTRUDE2_DEPTH, mode=Mode.SUBTRACT)

    # Sketch4<5> → Cut-Extrude3 (cut)
    with BuildSketch(Plane.XY.offset(-2.575).offset(CUT_EXTRUDE3_START)):
        with Locations((3.057402253, 22.304471444)):
            Circle(SKETCH4_5_R)
        with Locations((13.578309776, 22.304471444)):
            Circle(SKETCH4_5_R)
        with Locations((-4.882143985, 31.69)):
            Circle(SKETCH4_5_R_2)
        with Locations((19.68334966, 31.69)):
            Circle(SKETCH4_5_R_2)
    extrude(amount=CUT_EXTRUDE3_DEPTH, mode=Mode.SUBTRACT)

    # Boss-Extrude6: up to this face of the body (flat: up to its plane)
    boss_extrude6_end = Plane(part_1.part.faces().sort_by_distance((5.571215805, 24.148263907, 3.6))[0])
    # Sketch4<6> → Boss-Extrude6 (add, up to the picked face)
    with BuildSketch(Plane.XY.offset(-2.575), mode=Mode.PRIVATE) as boss_extrude6_sk1:
        with BuildLine():
            ThreePointArc((4.194316475, 16.597685982), (4.495824105, 16.525215906), (4.798603438, 16.458257419))
            ThreePointArc((4.798603438, 16.458257419), (8.627937882, 16.092828199), (12.441395555, 16.597685982))
            Line((12.441395555, 16.597685982), (8.317856015, 19.29))
            Line((8.317856015, 19.29), (4.194316475, 16.597685982))
        make_face()
    boss_extrude6_tool1 = split(extrude(boss_extrude6_sk1.sketch, amount=BOSS_EXTRUDE6_REACH, mode=Mode.PRIVATE), bisect_by=boss_extrude6_end, keep=Keep.BOTH, mode=Mode.PRIVATE)
    add(boss_extrude6_tool1.solids().sort_by(Axis((8.317856, 17.273432, -2.575), (0, 0, 1)))[0])

    # Boss-Extrude6 direction 2: up to this face of the body (flat: up to its plane)
    boss_extrude6_direction_2_end = Plane(part_1.part.faces().sort_by_distance((-0.1, -2.701599839, -8.75))[0])
    # Sketch4<6> → Boss-Extrude6 direction 2 (add, up to the picked face)
    with BuildSketch(Plane.XY.offset(-2.575), mode=Mode.PRIVATE) as boss_extrude6_direction_2_sk1:
        with BuildLine():
            ThreePointArc((4.194316475, 16.597685982), (4.495824105, 16.525215906), (4.798603438, 16.458257419))
            ThreePointArc((4.798603438, 16.458257419), (8.627937882, 16.092828199), (12.441395555, 16.597685982))
            Line((12.441395555, 16.597685982), (8.317856015, 19.29))
            Line((8.317856015, 19.29), (4.194316475, 16.597685982))
        make_face()
    boss_extrude6_direction_2_tool1 = split(extrude(boss_extrude6_direction_2_sk1.sketch, amount=-BOSS_EXTRUDE6_DIRECTION_2_REACH, mode=Mode.PRIVATE), bisect_by=boss_extrude6_direction_2_end, keep=Keep.BOTH, mode=Mode.PRIVATE)
    add(boss_extrude6_direction_2_tool1.solids().sort_by(Axis((8.317856, 17.273432, -2.575), (0, 0, -1)))[0])

    # Fillet1
    fillet1_edges = [part_1.edges().sort_by_distance(p)[0] for p in [
        (-2.882143985, 33.09, -2.475),
        (-2.882143985, 24.208167414, -2.475),
    ]]
    fillet(fillet1_edges, radius=FILLET1_R)

    # Chamfer3
    # the kernel refuses this chamfer: 0.4, 0.283047342 mm, written as the material it takes off along each edge
    with BuildSketch(Plane(origin=(-6.882143985, 34.09, -1.203673195), x_dir=(1, 0, 0), z_dir=(0, 0, 1)), Plane(origin=(-6.882143985, 28.89, -1.203673195), x_dir=(0, 1, 0), z_dir=(0, 0, 1)), Plane(origin=(-2.882143985, 34.09, -1.203673195), x_dir=(0, -1, 0), z_dir=(0, 0, 1)), Plane(origin=(21.917856015, 28.962870062, -1.203673195), x_dir=(-1, 0, 0), z_dir=(0, 0, 1))) as chamfer3_piece_1:
        Polygon((CHAMFER3_SIZE, 0), (0, -CHAMFER3_SIZE), (0, 0), align=None)
    extrude(amount=5.83234639, mode=Mode.SUBTRACT)
    with BuildSketch(Plane(origin=(17.517856015, 34.09, -1.203673195), x_dir=(0, -1, 0), z_dir=(0, 0, 1)), Plane(origin=(21.917856015, 34.09, -1.203673195), x_dir=(-1, 0, 0), z_dir=(0, 0, 1))) as chamfer3_piece_2:
        Polygon((CHAMFER3_SIZE, 0), (0, CHAMFER3_SIZE), (0, 0), align=None)
    extrude(amount=5.83234639, mode=Mode.SUBTRACT)
    with BuildSketch(Plane(origin=(21.917856015, 34.09, -9.778673195), x_dir=(0, -1, 0), z_dir=(0, 0, 1)), Plane(origin=(21.917856015, 28.962870062, -9.778673195), x_dir=(-1, 0, 0), z_dir=(0, 0, 1)), Plane(origin=(-2.882143985, 34.09, -9.778673195), x_dir=(0, -1, 0), z_dir=(0, 0, 1)), Plane(origin=(-6.882143985, 34.09, -9.778673195), x_dir=(1, 0, 0), z_dir=(0, 0, 1)), Plane(origin=(-6.882143985, 28.89, -9.778673195), x_dir=(0, 1, 0), z_dir=(0, 0, 1))) as chamfer3_piece_3:
        Polygon((CHAMFER3_SIZE, 0), (0, -CHAMFER3_SIZE), (0, 0), align=None)
    extrude(amount=6.03234639, mode=Mode.SUBTRACT)
    with BuildSketch(Plane(origin=(17.517856015, 34.09, -9.778673195), x_dir=(0, -1, 0), z_dir=(0, 0, 1))) as chamfer3_piece_4:
        Polygon((CHAMFER3_SIZE, 0), (0, CHAMFER3_SIZE), (0, 0), align=None)
    extrude(amount=6.03234639, mode=Mode.SUBTRACT)
    with BuildSketch(Plane(origin=(12.441395555, 16.597685982, -4.775), x_dir=(-0.9728915471161905, -0.2312618376426714, 0), z_dir=(0, 0, 1))) as chamfer3_piece_5:
        with BuildLine():
            Line((0.395427827, 0), (CHAMFER3_SIZE_2 * 0.688197210092, -CHAMFER3_SIZE_2 * 0.725523674515))
            Line((CHAMFER3_SIZE_2 * 0.688197210092, -CHAMFER3_SIZE_2 * 0.725523674515), (0, 0))
            ThreePointArc((0, 0), (0.203303091, 0.001148849), (0.395427827, 0))
        make_face()
    extrude(amount=4.6, mode=Mode.SUBTRACT)
    with BuildSketch(Plane(origin=(4.194316475, 16.597685982, -0.175), x_dir=(0.972121252868909, -0.23447871912091042, 0), z_dir=(0, 0, -1))) as chamfer3_piece_6:
        with BuildLine():
            Line((0.282967544, 0), (CHAMFER3_SIZE * 0.685793544933, -CHAMFER3_SIZE * 0.7277961353))
            Line((CHAMFER3_SIZE * 0.685793544933, -CHAMFER3_SIZE * 0.7277961353), (0, 0))
            ThreePointArc((0, 0), (0.141721271, 0.000588763), (0.282967544, 0))
        make_face()
    extrude(amount=4.6, mode=Mode.SUBTRACT)


solid = part_1.part
